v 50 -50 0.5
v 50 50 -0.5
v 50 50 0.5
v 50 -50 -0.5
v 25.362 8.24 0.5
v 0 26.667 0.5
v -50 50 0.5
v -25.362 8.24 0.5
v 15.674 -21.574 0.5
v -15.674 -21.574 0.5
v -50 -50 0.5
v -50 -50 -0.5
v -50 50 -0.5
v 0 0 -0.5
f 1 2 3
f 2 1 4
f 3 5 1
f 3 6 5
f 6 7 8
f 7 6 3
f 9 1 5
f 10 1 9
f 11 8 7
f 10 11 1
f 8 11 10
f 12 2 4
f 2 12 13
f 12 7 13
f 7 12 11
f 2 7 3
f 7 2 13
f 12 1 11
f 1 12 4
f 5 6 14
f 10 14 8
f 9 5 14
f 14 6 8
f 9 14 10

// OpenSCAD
module plate_with_cutouts() {
    difference() {
        // Base plate
        cube([100, 100, 1], center=true);
        
        // Central pentagonal cutout
        translate([0, 0, -0.5])
            rotate([0, 0, 18])
                cylinder(r1=0, r2=40, h=1.5, $fn=5);
        
        // Corner diamond-oriented square cutouts
        for (x = [-45, 45])
            for (y = [-45, 45])
                translate([x, y, -0.5])
                    rotate([0, 0, 45])
                        square([10, 10], center=true);
    }
}

plate_with_cutouts();
